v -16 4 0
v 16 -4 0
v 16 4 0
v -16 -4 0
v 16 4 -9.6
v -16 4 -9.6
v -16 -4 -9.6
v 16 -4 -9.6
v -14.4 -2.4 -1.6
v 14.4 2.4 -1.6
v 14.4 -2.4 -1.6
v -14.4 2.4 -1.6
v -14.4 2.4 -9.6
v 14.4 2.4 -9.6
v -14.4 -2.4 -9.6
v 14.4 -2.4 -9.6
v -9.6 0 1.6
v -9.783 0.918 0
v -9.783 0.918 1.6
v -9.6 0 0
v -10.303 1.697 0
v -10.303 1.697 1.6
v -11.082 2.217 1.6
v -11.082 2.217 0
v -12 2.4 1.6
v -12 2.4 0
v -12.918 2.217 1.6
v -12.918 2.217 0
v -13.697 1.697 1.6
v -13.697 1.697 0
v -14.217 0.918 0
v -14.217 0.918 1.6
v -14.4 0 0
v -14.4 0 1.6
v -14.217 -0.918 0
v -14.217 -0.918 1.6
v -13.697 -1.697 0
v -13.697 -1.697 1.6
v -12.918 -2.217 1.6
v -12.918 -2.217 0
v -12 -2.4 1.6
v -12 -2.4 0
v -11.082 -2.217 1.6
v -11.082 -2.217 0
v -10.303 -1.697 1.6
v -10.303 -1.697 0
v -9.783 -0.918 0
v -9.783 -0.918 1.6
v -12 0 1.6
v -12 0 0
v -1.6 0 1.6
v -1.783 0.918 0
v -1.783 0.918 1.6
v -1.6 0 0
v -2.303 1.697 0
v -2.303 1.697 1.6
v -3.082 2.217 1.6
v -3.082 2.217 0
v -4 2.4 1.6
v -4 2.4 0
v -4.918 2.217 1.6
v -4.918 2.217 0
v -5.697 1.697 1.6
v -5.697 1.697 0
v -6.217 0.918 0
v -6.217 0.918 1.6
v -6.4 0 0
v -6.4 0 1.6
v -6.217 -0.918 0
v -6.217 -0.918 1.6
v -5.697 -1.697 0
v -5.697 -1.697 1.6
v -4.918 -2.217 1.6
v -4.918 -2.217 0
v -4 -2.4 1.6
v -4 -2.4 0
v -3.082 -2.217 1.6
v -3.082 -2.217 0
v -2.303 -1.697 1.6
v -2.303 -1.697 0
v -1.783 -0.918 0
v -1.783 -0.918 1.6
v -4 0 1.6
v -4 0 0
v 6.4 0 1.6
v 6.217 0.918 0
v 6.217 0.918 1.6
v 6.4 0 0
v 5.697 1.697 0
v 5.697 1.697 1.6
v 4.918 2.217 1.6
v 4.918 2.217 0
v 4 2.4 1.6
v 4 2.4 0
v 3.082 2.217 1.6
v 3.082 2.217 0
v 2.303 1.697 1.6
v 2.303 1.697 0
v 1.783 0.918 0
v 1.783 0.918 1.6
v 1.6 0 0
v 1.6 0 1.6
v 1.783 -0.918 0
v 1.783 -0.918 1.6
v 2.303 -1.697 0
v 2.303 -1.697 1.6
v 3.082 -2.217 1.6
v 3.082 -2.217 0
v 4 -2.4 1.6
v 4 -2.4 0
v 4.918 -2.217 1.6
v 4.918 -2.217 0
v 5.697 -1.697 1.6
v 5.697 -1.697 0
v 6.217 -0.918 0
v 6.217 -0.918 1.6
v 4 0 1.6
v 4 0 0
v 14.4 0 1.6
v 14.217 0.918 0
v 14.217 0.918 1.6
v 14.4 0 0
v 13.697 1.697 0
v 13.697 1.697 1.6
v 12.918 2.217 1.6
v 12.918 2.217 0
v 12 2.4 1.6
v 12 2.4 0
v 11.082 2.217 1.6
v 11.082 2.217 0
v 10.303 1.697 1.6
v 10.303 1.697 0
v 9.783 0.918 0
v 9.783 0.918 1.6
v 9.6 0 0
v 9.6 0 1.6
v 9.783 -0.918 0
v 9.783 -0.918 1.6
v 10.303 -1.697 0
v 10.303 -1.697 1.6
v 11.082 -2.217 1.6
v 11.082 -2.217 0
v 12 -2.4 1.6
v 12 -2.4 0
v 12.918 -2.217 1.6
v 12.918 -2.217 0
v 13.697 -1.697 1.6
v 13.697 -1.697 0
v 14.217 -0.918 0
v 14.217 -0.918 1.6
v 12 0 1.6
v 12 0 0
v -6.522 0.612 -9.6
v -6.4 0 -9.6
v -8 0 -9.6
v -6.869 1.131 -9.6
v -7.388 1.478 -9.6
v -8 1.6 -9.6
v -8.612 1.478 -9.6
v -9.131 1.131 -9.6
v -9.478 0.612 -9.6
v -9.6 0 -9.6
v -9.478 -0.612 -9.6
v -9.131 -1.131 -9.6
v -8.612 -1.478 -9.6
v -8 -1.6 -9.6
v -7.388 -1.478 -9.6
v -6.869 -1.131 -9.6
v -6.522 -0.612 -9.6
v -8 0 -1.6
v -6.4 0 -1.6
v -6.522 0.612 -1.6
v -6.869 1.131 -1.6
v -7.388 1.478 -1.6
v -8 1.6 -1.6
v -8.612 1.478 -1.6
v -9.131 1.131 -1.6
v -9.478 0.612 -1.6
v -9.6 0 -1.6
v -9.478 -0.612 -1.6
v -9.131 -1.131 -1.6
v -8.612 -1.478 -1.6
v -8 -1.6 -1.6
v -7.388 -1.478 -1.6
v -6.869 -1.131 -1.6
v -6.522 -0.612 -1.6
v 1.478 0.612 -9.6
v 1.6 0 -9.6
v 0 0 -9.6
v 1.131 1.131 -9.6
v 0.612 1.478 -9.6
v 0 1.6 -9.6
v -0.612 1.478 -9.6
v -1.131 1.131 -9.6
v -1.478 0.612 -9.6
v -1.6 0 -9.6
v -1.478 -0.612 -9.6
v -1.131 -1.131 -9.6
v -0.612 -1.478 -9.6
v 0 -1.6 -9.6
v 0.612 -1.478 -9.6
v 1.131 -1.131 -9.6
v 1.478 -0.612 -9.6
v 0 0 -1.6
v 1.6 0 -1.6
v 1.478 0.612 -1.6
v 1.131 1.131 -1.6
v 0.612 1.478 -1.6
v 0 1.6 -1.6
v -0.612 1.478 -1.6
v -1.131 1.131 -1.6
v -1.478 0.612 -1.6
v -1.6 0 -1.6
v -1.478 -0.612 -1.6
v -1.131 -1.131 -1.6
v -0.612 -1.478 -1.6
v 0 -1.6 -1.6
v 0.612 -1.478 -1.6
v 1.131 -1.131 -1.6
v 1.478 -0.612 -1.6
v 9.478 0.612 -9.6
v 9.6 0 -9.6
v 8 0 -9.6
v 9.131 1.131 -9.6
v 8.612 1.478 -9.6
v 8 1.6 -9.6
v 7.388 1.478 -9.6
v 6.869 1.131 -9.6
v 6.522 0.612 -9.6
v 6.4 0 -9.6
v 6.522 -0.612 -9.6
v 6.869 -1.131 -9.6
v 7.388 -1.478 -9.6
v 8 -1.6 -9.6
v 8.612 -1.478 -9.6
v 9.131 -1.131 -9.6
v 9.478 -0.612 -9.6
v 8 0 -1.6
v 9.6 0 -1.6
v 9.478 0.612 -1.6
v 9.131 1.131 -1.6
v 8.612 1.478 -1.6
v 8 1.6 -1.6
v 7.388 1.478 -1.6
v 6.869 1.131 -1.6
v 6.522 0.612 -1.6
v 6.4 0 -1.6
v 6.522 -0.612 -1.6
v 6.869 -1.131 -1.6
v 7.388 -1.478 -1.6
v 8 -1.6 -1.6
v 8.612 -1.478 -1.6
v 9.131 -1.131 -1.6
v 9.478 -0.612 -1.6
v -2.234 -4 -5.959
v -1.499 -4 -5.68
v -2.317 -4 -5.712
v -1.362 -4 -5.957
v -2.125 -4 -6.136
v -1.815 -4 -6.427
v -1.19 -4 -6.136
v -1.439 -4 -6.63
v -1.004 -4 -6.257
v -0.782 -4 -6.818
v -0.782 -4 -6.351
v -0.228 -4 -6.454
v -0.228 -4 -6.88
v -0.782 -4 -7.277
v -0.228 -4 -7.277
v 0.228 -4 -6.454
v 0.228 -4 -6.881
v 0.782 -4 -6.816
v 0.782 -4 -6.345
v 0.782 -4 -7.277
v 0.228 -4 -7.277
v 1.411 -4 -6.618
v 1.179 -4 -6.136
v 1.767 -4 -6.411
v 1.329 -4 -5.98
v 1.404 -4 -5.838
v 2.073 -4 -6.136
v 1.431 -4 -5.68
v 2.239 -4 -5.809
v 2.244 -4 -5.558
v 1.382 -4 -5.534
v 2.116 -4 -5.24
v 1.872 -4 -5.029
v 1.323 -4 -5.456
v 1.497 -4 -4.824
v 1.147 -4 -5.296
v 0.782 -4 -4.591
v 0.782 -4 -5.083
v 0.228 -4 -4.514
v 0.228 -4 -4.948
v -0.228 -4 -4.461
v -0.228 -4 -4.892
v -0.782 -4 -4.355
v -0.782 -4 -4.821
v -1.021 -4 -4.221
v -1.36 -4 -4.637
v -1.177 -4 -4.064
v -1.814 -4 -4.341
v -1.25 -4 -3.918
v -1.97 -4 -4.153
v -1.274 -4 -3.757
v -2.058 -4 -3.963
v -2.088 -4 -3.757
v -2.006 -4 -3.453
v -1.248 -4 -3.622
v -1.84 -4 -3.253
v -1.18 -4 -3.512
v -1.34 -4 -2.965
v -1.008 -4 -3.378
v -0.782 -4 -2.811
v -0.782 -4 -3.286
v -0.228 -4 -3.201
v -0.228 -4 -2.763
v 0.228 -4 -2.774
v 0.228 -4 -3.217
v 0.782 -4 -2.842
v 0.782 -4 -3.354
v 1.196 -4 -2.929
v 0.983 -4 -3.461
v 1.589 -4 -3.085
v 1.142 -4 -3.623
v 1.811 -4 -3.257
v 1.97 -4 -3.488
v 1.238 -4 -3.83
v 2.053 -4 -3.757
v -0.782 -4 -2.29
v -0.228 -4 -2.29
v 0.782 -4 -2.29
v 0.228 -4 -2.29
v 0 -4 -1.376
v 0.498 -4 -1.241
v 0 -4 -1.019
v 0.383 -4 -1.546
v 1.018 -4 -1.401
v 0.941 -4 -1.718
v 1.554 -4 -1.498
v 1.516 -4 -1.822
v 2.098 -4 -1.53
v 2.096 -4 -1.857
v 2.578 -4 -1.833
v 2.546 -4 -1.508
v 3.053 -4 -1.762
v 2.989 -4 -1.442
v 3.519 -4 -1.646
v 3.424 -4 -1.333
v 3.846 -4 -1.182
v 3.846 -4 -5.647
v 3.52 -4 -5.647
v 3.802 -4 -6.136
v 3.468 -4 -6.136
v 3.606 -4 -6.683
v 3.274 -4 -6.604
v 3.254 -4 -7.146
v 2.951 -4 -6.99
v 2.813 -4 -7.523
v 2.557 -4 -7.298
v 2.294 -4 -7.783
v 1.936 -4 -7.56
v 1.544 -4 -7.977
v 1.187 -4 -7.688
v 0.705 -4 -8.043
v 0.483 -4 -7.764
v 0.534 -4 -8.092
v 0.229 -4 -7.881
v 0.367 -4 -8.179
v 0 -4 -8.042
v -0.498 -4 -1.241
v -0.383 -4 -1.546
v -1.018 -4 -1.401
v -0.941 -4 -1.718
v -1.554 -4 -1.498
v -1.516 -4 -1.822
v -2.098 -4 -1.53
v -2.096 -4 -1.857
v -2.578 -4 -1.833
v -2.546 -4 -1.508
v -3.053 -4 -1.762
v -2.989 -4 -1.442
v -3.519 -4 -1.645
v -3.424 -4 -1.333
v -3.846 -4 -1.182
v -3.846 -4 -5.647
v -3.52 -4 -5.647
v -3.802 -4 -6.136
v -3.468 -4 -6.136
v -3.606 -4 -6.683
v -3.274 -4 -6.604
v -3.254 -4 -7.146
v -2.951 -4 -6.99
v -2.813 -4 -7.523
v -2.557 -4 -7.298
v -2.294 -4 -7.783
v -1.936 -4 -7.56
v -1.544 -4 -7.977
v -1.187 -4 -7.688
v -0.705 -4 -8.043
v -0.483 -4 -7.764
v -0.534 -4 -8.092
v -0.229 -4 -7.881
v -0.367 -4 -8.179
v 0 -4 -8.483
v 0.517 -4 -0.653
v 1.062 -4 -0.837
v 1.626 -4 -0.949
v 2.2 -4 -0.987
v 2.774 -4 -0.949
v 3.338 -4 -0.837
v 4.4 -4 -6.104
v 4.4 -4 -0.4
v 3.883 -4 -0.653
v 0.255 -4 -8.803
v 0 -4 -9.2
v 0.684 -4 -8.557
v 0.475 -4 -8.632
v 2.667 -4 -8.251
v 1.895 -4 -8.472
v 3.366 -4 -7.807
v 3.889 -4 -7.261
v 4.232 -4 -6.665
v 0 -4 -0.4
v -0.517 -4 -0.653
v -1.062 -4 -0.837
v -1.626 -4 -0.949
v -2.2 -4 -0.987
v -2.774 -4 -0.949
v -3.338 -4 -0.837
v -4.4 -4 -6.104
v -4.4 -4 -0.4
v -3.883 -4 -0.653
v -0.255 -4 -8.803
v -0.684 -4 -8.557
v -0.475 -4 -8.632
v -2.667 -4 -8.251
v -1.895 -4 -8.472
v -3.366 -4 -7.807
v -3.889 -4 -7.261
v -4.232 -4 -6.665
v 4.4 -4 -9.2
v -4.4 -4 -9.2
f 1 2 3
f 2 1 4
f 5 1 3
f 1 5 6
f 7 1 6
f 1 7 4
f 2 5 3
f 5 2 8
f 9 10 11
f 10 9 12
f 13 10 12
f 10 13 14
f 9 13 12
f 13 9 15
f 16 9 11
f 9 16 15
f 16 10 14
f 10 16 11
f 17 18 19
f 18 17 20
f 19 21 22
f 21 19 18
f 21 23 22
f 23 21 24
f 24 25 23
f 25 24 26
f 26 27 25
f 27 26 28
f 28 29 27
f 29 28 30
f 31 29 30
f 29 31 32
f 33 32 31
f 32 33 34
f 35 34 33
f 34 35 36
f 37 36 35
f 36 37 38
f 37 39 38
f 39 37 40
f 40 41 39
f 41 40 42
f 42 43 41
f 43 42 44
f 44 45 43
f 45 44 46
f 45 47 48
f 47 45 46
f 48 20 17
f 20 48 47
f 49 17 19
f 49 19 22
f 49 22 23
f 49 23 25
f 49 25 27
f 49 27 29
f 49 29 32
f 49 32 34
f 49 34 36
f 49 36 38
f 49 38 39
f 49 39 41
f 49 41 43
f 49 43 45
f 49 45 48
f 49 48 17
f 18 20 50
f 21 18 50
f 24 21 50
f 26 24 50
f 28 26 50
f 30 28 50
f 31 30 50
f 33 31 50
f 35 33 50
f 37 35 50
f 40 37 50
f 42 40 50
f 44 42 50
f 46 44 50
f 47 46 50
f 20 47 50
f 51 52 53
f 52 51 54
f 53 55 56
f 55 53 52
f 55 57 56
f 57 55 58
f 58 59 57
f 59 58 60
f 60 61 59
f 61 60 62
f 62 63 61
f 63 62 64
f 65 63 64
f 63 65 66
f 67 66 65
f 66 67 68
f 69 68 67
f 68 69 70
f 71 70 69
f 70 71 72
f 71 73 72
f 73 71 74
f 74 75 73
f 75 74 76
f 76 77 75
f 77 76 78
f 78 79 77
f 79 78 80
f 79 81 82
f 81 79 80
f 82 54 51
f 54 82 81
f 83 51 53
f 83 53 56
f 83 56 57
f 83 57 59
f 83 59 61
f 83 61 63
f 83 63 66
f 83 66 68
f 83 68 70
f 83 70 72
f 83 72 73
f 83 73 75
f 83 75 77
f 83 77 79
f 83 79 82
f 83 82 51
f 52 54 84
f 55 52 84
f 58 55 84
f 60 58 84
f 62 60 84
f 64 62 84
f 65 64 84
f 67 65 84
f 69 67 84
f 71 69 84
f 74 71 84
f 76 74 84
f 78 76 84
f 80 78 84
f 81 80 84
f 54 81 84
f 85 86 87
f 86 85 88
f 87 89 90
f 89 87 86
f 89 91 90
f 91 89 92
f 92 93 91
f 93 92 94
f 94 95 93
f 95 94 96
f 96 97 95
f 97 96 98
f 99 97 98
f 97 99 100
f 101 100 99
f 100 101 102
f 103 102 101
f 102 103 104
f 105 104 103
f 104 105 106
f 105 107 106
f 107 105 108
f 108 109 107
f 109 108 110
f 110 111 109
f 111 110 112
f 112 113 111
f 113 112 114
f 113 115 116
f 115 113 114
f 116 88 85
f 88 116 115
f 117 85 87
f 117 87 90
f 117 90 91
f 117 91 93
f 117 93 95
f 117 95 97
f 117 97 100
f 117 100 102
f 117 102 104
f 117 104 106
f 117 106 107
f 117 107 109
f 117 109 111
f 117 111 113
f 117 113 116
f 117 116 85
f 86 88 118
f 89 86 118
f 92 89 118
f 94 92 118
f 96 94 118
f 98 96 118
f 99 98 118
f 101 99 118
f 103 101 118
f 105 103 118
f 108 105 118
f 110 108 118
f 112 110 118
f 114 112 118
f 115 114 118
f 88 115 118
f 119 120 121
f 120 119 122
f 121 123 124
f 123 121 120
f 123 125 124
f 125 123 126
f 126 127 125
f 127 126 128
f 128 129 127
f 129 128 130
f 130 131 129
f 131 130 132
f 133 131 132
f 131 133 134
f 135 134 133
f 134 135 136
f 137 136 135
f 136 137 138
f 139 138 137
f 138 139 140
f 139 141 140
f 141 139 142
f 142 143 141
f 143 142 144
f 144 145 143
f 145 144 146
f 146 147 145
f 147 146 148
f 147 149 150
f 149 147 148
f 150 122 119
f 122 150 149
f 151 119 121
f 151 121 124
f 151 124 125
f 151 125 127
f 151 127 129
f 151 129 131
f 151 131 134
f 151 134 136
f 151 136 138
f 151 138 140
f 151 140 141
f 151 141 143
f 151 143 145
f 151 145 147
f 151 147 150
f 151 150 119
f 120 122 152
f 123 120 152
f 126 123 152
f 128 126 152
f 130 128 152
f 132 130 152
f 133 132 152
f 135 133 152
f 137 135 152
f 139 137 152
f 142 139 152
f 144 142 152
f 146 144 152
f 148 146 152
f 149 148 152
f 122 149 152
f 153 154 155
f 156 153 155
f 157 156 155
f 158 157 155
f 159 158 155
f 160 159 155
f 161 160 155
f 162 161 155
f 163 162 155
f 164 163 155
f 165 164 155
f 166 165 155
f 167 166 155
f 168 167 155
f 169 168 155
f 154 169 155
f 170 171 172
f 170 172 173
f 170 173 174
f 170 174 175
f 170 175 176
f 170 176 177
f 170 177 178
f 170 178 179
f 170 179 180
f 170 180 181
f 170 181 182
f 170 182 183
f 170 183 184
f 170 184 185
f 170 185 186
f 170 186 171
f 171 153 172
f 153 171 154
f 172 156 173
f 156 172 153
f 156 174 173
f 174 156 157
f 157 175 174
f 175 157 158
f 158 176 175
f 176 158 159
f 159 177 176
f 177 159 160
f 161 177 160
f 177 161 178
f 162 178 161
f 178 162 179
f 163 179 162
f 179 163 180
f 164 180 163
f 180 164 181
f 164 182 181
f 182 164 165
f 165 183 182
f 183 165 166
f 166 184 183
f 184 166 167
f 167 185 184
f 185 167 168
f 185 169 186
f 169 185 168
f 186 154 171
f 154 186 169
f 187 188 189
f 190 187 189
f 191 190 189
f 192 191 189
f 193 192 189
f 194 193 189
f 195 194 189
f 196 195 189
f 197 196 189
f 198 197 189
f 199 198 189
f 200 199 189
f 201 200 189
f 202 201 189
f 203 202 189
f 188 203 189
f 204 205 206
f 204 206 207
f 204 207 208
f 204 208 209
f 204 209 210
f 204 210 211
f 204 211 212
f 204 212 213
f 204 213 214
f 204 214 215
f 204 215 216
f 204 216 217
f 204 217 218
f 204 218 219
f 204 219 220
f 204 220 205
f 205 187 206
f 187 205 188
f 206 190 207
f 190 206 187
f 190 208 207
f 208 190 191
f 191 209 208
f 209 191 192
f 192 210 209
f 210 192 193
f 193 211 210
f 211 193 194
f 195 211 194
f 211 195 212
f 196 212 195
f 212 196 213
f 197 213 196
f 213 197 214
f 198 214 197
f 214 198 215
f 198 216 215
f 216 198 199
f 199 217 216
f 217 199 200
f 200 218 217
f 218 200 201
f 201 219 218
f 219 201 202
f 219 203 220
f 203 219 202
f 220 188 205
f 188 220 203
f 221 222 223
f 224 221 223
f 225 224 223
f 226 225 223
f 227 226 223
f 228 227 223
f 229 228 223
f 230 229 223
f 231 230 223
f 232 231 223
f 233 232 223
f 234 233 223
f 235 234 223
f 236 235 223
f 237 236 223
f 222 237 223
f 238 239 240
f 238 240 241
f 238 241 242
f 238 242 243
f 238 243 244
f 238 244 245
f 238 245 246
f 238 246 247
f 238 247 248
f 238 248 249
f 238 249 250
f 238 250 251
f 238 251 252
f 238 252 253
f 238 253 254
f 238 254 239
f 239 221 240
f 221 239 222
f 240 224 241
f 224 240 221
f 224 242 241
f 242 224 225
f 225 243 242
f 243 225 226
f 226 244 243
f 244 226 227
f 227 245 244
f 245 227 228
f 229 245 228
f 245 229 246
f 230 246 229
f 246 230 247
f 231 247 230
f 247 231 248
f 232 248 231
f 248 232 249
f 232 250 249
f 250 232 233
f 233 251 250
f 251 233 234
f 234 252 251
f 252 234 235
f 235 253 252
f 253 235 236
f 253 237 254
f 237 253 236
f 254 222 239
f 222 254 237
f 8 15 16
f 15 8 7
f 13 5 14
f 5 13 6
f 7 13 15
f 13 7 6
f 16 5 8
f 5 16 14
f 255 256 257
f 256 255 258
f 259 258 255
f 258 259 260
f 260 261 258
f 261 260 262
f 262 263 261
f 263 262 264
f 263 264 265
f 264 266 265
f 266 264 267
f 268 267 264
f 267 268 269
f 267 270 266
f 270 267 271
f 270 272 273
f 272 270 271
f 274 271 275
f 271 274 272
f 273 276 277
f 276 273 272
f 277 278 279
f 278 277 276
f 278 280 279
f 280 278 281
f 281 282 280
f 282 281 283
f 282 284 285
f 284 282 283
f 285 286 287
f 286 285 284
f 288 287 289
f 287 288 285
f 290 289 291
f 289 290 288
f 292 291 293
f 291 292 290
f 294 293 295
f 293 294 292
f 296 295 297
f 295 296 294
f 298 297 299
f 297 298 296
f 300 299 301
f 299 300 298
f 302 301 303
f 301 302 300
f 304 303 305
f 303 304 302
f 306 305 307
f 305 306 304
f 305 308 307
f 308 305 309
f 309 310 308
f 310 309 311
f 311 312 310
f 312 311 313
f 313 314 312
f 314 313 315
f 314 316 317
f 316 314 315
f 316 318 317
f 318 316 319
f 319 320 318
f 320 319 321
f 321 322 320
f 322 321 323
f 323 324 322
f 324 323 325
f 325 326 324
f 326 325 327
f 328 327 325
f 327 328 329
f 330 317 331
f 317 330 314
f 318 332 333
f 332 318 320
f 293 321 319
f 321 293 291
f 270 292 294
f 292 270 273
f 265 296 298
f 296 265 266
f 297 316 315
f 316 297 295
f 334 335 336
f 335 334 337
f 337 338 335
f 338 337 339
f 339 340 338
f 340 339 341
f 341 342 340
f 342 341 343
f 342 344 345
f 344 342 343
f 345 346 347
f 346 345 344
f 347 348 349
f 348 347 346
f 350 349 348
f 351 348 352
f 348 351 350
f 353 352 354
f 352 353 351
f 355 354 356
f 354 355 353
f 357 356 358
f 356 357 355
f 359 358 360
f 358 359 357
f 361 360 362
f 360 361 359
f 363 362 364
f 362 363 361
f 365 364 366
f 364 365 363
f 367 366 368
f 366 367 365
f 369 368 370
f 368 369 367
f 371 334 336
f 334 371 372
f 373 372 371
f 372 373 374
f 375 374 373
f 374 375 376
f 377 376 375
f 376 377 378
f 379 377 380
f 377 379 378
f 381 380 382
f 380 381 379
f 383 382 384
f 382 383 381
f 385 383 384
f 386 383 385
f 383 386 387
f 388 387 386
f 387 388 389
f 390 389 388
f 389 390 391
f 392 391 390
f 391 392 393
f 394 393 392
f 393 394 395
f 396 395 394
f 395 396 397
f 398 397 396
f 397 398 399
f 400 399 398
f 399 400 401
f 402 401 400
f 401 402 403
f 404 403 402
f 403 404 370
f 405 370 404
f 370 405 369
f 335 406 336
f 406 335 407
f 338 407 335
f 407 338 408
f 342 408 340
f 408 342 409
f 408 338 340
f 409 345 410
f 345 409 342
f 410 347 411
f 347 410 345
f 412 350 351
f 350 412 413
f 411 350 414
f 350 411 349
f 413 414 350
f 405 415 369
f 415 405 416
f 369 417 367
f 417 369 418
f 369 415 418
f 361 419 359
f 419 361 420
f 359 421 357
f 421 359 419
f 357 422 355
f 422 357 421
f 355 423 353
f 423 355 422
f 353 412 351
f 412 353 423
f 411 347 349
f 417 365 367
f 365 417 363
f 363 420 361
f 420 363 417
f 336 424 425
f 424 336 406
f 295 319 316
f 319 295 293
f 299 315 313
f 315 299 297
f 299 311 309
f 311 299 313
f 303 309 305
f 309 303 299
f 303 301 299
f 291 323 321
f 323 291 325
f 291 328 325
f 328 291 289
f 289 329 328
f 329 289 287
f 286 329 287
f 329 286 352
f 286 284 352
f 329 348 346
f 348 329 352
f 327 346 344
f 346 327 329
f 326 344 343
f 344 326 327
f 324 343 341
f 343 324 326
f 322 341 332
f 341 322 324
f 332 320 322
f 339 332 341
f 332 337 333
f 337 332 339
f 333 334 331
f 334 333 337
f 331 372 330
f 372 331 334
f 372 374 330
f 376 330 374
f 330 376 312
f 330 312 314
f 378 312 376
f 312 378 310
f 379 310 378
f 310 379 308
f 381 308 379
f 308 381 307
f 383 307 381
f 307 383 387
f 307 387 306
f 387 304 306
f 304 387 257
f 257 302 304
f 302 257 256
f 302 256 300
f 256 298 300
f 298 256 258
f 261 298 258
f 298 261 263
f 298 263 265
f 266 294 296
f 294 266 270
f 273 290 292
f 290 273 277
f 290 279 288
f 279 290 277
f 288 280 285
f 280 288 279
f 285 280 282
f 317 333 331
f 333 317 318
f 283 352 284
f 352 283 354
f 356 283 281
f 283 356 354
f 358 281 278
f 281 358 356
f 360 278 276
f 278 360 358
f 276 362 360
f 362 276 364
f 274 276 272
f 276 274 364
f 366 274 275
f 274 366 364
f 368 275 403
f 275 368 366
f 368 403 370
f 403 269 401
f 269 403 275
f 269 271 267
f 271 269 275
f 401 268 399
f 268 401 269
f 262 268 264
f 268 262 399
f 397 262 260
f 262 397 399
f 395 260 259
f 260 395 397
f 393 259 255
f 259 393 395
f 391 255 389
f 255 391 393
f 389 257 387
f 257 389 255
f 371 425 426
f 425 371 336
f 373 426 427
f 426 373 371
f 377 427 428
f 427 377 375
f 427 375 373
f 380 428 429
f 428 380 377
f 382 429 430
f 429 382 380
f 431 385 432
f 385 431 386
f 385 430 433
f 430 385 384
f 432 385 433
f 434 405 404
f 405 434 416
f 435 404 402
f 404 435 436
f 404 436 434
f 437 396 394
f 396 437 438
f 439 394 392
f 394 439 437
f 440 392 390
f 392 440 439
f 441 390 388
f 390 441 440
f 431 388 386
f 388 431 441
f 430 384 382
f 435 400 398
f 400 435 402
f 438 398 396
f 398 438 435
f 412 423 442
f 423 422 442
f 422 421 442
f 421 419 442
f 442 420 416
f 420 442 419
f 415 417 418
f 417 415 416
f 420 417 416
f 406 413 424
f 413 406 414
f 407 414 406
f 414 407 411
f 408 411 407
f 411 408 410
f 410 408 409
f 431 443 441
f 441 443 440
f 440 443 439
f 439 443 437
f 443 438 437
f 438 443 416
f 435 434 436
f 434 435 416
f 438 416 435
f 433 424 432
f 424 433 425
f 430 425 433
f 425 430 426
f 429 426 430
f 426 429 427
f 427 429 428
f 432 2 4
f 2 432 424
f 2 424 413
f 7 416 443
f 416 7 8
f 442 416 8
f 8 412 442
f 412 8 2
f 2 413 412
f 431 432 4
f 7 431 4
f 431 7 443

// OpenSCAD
// file: ../p/4-4edge.scad
use <../lib.scad>
function ldraw_lib__4_4edge() = [
// 0 Circle 1.0
// 0 Name: 4-4edge.dat
// 0 Author: James Jessiman
// 0 !LDRAW_ORG Primitive UPDATE 2017-01
// 0 !LICENSE Licensed under CC BY 2.0 and CC BY 4.0 : see CAreadme.txt
// 
// 0 BFC CERTIFY CCW
  [0,"BFC","CERTIFY"],
  [0,"BFC","CCW"],
// 
// 0 !HISTORY 1998-12-15 [PTadmin] Official Update 1998-10
// 0 !HISTORY 2005-12-28 [PTadmin] Official Update 2005-01
// 0 !HISTORY 2007-06-24 [PTadmin] Header formatted for Contributor Agreement
// 0 !HISTORY 2008-07-01 [PTadmin] Official Update 2008-01
// 0 !HISTORY 2017-01-15 [Steffen] BFCed
// 0 !HISTORY 2017-12-30 [PTadmin] Official Update 2017-01
// 
// 
// 2 24 1 0 0 0.9239 0 0.3827
  [2,24,1,0,0,0.9239,0,0.3827],
// 2 24 0.9239 0 0.3827 0.7071 0 0.7071
  [2,24,0.9239,0,0.3827,0.7071,0,0.7071],
// 2 24 0.7071 0 0.7071 0.3827 0 0.9239
  [2,24,0.7071,0,0.7071,0.3827,0,0.9239],
// 2 24 0.3827 0 0.9239 0 0 1
  [2,24,0.3827,0,0.9239,0,0,1],
// 2 24 0 0 1 -0.3827 0 0.9239
  [2,24,0,0,1,-0.3827,0,0.9239],
// 2 24 -0.3827 0 0.9239 -0.7071 0 0.7071
  [2,24,-0.3827,0,0.9239,-0.7071,0,0.7071],
// 2 24 -0.7071 0 0.7071 -0.9239 0 0.3827
  [2,24,-0.7071,0,0.7071,-0.9239,0,0.3827],
// 2 24 -0.9239 0 0.3827 -1 0 -0
  [2,24,-0.9239,0,0.3827,-1,0,-0],
// 2 24 -1 0 -0 -0.9239 0 -0.3827
  [2,24,-1,0,-0,-0.9239,0,-0.3827],
// 2 24 -0.9239 0 -0.3827 -0.7071 0 -0.7071
  [2,24,-0.9239,0,-0.3827,-0.7071,0,-0.7071],
// 2 24 -0.7071 0 -0.7071 -0.3827 0 -0.9239
  [2,24,-0.7071,0,-0.7071,-0.3827,0,-0.9239],
// 2 24 -0.3827 0 -0.9239 0 0 -1
  [2,24,-0.3827,0,-0.9239,0,0,-1],
// 2 24 0 0 -1 0.3827 0 -0.9239
  [2,24,0,0,-1,0.3827,0,-0.9239],
// 2 24 0.3827 0 -0.9239 0.7071 0 -0.7071
  [2,24,0.3827,0,-0.9239,0.7071,0,-0.7071],
// 2 24 0.7071 0 -0.7071 0.9239 0 -0.3827
  [2,24,0.7071,0,-0.7071,0.9239,0,-0.3827],
// 2 24 0.9239 0 -0.3827 1 0 0
  [2,24,0.9239,0,-0.3827,1,0,0],
];
module ldraw_lib__4_4edge(step=0, col=false, unit=2/5, alt=false, line=0.2, solid=!$preview)
    makepoly(ldraw_lib__4_4edge(), step=step, col=col, unit=unit, alt=alt, line=line, solid=solid);
ldraw_lib__4_4edge(line=0.2);
// file: ../p/4-4disc.scad
use <../lib.scad>
function ldraw_lib__4_4disc() = [
// 0 Disc 1.0
// 0 Name: 4-4disc.dat
// 0 Author: James Jessiman
// 0 !LDRAW_ORG Primitive UPDATE 2002-02
// 0 !LICENSE Licensed under CC BY 2.0 and CC BY 4.0 : see CAreadme.txt
// 
// 0 BFC CERTIFY CCW
  [0,"BFC","CERTIFY"],
  [0,"BFC","CCW"],
// 
// 0 !HISTORY 1998-12-15 [PTadmin] Official Update 1998-10
// 0 !HISTORY 2002-03-23 [sbliss] Added BFC statement
// 0 !HISTORY 2002-04-25 [PTadmin] Official Update 2002-02
// 0 !HISTORY 2007-06-24 [PTadmin] Header formatted for Contributor Agreement
// 0 !HISTORY 2008-07-01 [PTadmin] Official Update 2008-01
// 
// 
// 3 16 0 0 0 1 0 0 0.9239 0 0.3827
  [3,16,0,0,0,1,0,0,0.9239,0,0.3827],
// 3 16 0 0 0 0.9239 0 0.3827 0.7071 0 0.7071
  [3,16,0,0,0,0.9239,0,0.3827,0.7071,0,0.7071],
// 3 16 0 0 0 0.7071 0 0.7071 0.3827 0 0.9239
  [3,16,0,0,0,0.7071,0,0.7071,0.3827,0,0.9239],
// 3 16 0 0 0 0.3827 0 0.9239 0 0 1
  [3,16,0,0,0,0.3827,0,0.9239,0,0,1],
// 3 16 0 0 0 0 0 1 -0.3827 0 0.9239
  [3,16,0,0,0,0,0,1,-0.3827,0,0.9239],
// 3 16 0 0 0 -0.3827 0 0.9239 -0.7071 0 0.7071
  [3,16,0,0,0,-0.3827,0,0.9239,-0.7071,0,0.7071],
// 3 16 0 0 0 -0.7071 0 0.7071 -0.9239 0 0.3827
  [3,16,0,0,0,-0.7071,0,0.7071,-0.9239,0,0.3827],
// 3 16 0 0 0 -0.9239 0 0.3827 -1 0 -0
  [3,16,0,0,0,-0.9239,0,0.3827,-1,0,-0],
// 3 16 0 0 0 -1 0 -0 -0.9239 0 -0.3827
  [3,16,0,0,0,-1,0,-0,-0.9239,0,-0.3827],
// 3 16 0 0 0 -0.9239 0 -0.3827 -0.7071 0 -0.7071
  [3,16,0,0,0,-0.9239,0,-0.3827,-0.7071,0,-0.7071],
// 3 16 0 0 0 -0.7071 0 -0.7071 -0.3827 0 -0.9239
  [3,16,0,0,0,-0.7071,0,-0.7071,-0.3827,0,-0.9239],
// 3 16 0 0 0 -0.3827 0 -0.9239 0 0 -1
  [3,16,0,0,0,-0.3827,0,-0.9239,0,0,-1],
// 3 16 0 0 0 0 0 -1 0.3827 0 -0.9239
  [3,16,0,0,0,0,0,-1,0.3827,0,-0.9239],
// 3 16 0 0 0 0.3827 0 -0.9239 0.7071 0 -0.7071
  [3,16,0,0,0,0.3827,0,-0.9239,0.7071,0,-0.7071],
// 3 16 0 0 0 0.7071 0 -0.7071 0.9239 0 -0.3827
  [3,16,0,0,0,0.7071,0,-0.7071,0.9239,0,-0.3827],
// 3 16 0 0 0 0.9239 0 -0.3827 1 0 0
  [3,16,0,0,0,0.9239,0,-0.3827,1,0,0],
// 0
];
module ldraw_lib__4_4disc(step=0, col=false, unit=2/5, alt=false, line=0.2, solid=!$preview)
    makepoly(ldraw_lib__4_4disc(), step=step, col=col, unit=unit, alt=alt, line=line, solid=solid);
ldraw_lib__4_4disc(line=0.2);
// file: ../p/4-4cyli.scad
use <../lib.scad>
$fa=1; $fs=0.2;
function ldraw_lib__4_4cyli(realsolid=false) = [
// 0 Cylinder 1.0
// 0 Name: 4-4cyli.dat
// 0 Author: James Jessiman
// 0 !LDRAW_ORG Primitive UPDATE 2005-01
// 0 !LICENSE Licensed under CC BY 2.0 and CC BY 4.0 : see CAreadme.txt
// 
// 0 BFC CERTIFY CCW
  [0,"BFC","CERTIFY"],
  [0,"BFC","CCW"],
// 
// 0 !HISTORY 1998-12-15 [PTadmin] Official Update 1998-10
// 0 !HISTORY 2002-03-23 [sbliss] Added BFC statement; merged headers from files in distributions LDraw 0.27 and Complete.
// 0 !HISTORY 2002-04-25 [PTadmin] Official Update 2002-02
// 0 !HISTORY 2004-12-14 [guyvivan] BFC CCW
// 0 !HISTORY 2005-12-28 [PTadmin] Official Update 2005-01
// 0 !HISTORY 2007-06-24 [PTadmin] Header formatted for Contributor Agreement
// 0 !HISTORY 2008-07-01 [PTadmin] Official Update 2008-01
// 
// 
// 4 16 1 1 0 0.9239 1 0.3827 0.9239 0 0.3827 1 0 0
  [4,16,1,1,0,0.9239,1,0.3827,0.9239,0,0.3827,1,0,0],
// 5 24 1 0 0 1 1 0 0.9239 0 0.3827 0.9239 0 -0.3827
  [5,24,1,0,0,1,1,0,0.9239,0,0.3827,0.9239,0,-0.3827],
// 4 16 0.9239 1 0.3827 0.7071 1 0.7071 0.7071 0 0.7071 0.9239 0 0.3827
  [4,16,0.9239,1,0.3827,0.7071,1,0.7071,0.7071,0,0.7071,0.9239,0,0.3827],
// 5 24 0.9239 0 0.3827 0.9239 1 0.3827 0.7071 0 0.7071 1 0 0
  [5,24,0.9239,0,0.3827,0.9239,1,0.3827,0.7071,0,0.7071,1,0,0],
// 4 16 0.7071 1 0.7071 0.3827 1 0.9239 0.3827 0 0.9239 0.7071 0 0.7071
  [4,16,0.7071,1,0.7071,0.3827,1,0.9239,0.3827,0,0.9239,0.7071,0,0.7071],
// 5 24 0.7071 0 0.7071 0.7071 1 0.7071 0.3827 0 0.9239 0.9239 0 0.3827
  [5,24,0.7071,0,0.7071,0.7071,1,0.7071,0.3827,0,0.9239,0.9239,0,0.3827],
// 4 16 0.3827 1 0.9239 0 1 1 0 0 1 0.3827 0 0.9239
  [4,16,0.3827,1,0.9239,0,1,1,0,0,1,0.3827,0,0.9239],
// 5 24 0.3827 0 0.9239 0.3827 1 0.9239 0 0 1 0.7071 0 0.7071
  [5,24,0.3827,0,0.9239,0.3827,1,0.9239,0,0,1,0.7071,0,0.7071],
// 4 16 0 1 1 -0.3827 1 0.9239 -0.3827 0 0.9239 0 0 1
  [4,16,0,1,1,-0.3827,1,0.9239,-0.3827,0,0.9239,0,0,1],
// 5 24 0 0 1 0 1 1 -0.3827 0 0.9239 0.3827 0 0.9239
  [5,24,0,0,1,0,1,1,-0.3827,0,0.9239,0.3827,0,0.9239],
// 4 16 -0.3827 1 0.9239 -0.7071 1 0.7071 -0.7071 0 0.7071 -0.3827 0 0.9239
  [4,16,-0.3827,1,0.9239,-0.7071,1,0.7071,-0.7071,0,0.7071,-0.3827,0,0.9239],
// 5 24 -0.3827 0 0.9239 -0.3827 1 0.9239 -0.7071 0 0.7071 0 0 1
  [5,24,-0.3827,0,0.9239,-0.3827,1,0.9239,-0.7071,0,0.7071,0,0,1],
// 4 16 -0.7071 1 0.7071 -0.9239 1 0.3827 -0.9239 0 0.3827 -0.7071 0 0.7071
  [4,16,-0.7071,1,0.7071,-0.9239,1,0.3827,-0.9239,0,0.3827,-0.7071,0,0.7071],
// 5 24 -0.7071 0 0.7071 -0.7071 1 0.7071 -0.9239 0 0.3827 -0.3827 0 0.9239
  [5,24,-0.7071,0,0.7071,-0.7071,1,0.7071,-0.9239,0,0.3827,-0.3827,0,0.9239],
// 4 16 -0.9239 1 0.3827 -1 1 0 -1 0 0 -0.9239 0 0.3827
  [4,16,-0.9239,1,0.3827,-1,1,0,-1,0,0,-0.9239,0,0.3827],
// 5 24 -0.9239 0 0.3827 -0.9239 1 0.3827 -1 0 0 -0.7071 0 0.7071
  [5,24,-0.9239,0,0.3827,-0.9239,1,0.3827,-1,0,0,-0.7071,0,0.7071],
// 4 16 -1 1 0 -0.9239 1 -0.3827 -0.9239 0 -0.3827 -1 0 0
  [4,16,-1,1,0,-0.9239,1,-0.3827,-0.9239,0,-0.3827,-1,0,0],
// 5 24 -1 0 0 -1 1 0 -0.9239 0 -0.3827 -0.9239 0 0.3827
  [5,24,-1,0,0,-1,1,0,-0.9239,0,-0.3827,-0.9239,0,0.3827],
// 4 16 -0.9239 1 -0.3827 -0.7071 1 -0.7071 -0.7071 0 -0.7071 -0.9239 0 -0.3827
  [4,16,-0.9239,1,-0.3827,-0.7071,1,-0.7071,-0.7071,0,-0.7071,-0.9239,0,-0.3827],
// 5 24 -0.9239 0 -0.3827 -0.9239 1 -0.3827 -0.7071 0 -0.7071 -1 0 0
  [5,24,-0.9239,0,-0.3827,-0.9239,1,-0.3827,-0.7071,0,-0.7071,-1,0,0],
// 4 16 -0.7071 1 -0.7071 -0.3827 1 -0.9239 -0.3827 0 -0.9239 -0.7071 0 -0.7071
  [4,16,-0.7071,1,-0.7071,-0.3827,1,-0.9239,-0.3827,0,-0.9239,-0.7071,0,-0.7071],
// 5 24 -0.7071 0 -0.7071 -0.7071 1 -0.7071 -0.3827 0 -0.9239 -0.9239 0 -0.3827
  [5,24,-0.7071,0,-0.7071,-0.7071,1,-0.7071,-0.3827,0,-0.9239,-0.9239,0,-0.3827],
// 4 16 -0.3827 1 -0.9239 0 1 -1 0 0 -1 -0.3827 0 -0.9239
  [4,16,-0.3827,1,-0.9239,0,1,-1,0,0,-1,-0.3827,0,-0.9239],
// 5 24 -0.3827 0 -0.9239 -0.3827 1 -0.9239 0 0 -1 -0.7071 0 -0.7071
  [5,24,-0.3827,0,-0.9239,-0.3827,1,-0.9239,0,0,-1,-0.7071,0,-0.7071],
// 4 16 0 1 -1 0.3827 1 -0.9239 0.3827 0 -0.9239 0 0 -1
  [4,16,0,1,-1,0.3827,1,-0.9239,0.3827,0,-0.9239,0,0,-1],
// 5 24 0 0 -1 0 1 -1 0.3827 0 -0.9239 -0.3827 0 -0.9239
  [5,24,0,0,-1,0,1,-1,0.3827,0,-0.9239,-0.3827,0,-0.9239],
// 4 16 0.3827 1 -0.9239 0.7071 1 -0.7071 0.7071 0 -0.7071 0.3827 0 -0.9239
  [4,16,0.3827,1,-0.9239,0.7071,1,-0.7071,0.7071,0,-0.7071,0.3827,0,-0.9239],
// 5 24 0.3827 0 -0.9239 0.3827 1 -0.9239 0.7071 0 -0.7071 0 0 -1
  [5,24,0.3827,0,-0.9239,0.3827,1,-0.9239,0.7071,0,-0.7071,0,0,-1],
// 4 16 0.7071 1 -0.7071 0.9239 1 -0.3827 0.9239 0 -0.3827 0.7071 0 -0.7071
  [4,16,0.7071,1,-0.7071,0.9239,1,-0.3827,0.9239,0,-0.3827,0.7071,0,-0.7071],
// 5 24 0.7071 0 -0.7071 0.7071 1 -0.7071 0.9239 0 -0.3827 0.3827 0 -0.9239
  [5,24,0.7071,0,-0.7071,0.7071,1,-0.7071,0.9239,0,-0.3827,0.3827,0,-0.9239],
// 4 16 0.9239 1 -0.3827 1 1 0 1 0 0 0.9239 0 -0.3827
  [4,16,0.9239,1,-0.3827,1,1,0,1,0,0,0.9239,0,-0.3827],
// 5 24 0.9239 0 -0.3827 0.9239 1 -0.3827 1 0 0 0.7071 0 -0.7071
  [5,24,0.9239,0,-0.3827,0.9239,1,-0.3827,1,0,0,0.7071,0,-0.7071],
// 0
];
module ldraw_lib__4_4cyli(step=0, col=false, unit=2/5, alt=false, line=0.2, solid=!$preview)
    makepoly(ldraw_lib__4_4cyli(solid), step=step, col=col, unit=unit, alt=alt, line=line, solid=solid);
ldraw_lib__4_4cyli(line=0.2);
// file: ../p/stud3.scad
use <../lib.scad>
use <4-4cyli.scad>
use <4-4disc.scad>
use <4-4edge.scad>
function ldraw_lib__stud3() = [
// 0 Stud Tube Solid
// 0 Name: stud3.dat
// 0 Author: James Jessiman
// 0 !LDRAW_ORG Primitive UPDATE 2012-01
// 0 !LICENSE Licensed under CC BY 4.0 : see CAreadme.txt
// 
// 0 BFC CERTIFY CCW
  [0,"BFC","CERTIFY"],
  [0,"BFC","CCW"],
// 
// 0 !HISTORY 2002-04-04 [sbliss] Modified for BFC compliance
// 0 !HISTORY 2002-04-25 [PTadmin] Official Update 2002-02
// 0 !HISTORY 2007-06-24 [PTadmin] Header formatted for Contributor Agreement
// 0 !HISTORY 2008-07-01 [PTadmin] Official Update 2008-01
// 0 !HISTORY 2012-02-16 [Philo] Changed to CCW
// 0 !HISTORY 2012-03-30 [PTadmin] Official Update 2012-01
// 
// 
// 1 16 0 -4 0 4 0 0 0 1 0 0 0 4 4-4edge.dat
  [1,16,0,-4,0,4,0,0,0,1,0,0,0,4, ldraw_lib__4_4edge()],
// 1 16 0 0 0 4 0 0 0 1 0 0 0 4 4-4edge.dat
  [1,16,0,0,0,4,0,0,0,1,0,0,0,4, ldraw_lib__4_4edge()],
// 1 16 0 -4 0 4 0 0 0 1 0 0 0 4 4-4disc.dat
  [1,16,0,-4,0,4,0,0,0,1,0,0,0,4, ldraw_lib__4_4disc()],
  [-1,16,0,0,0,4,0,0,0,-1,0,0,0,4, ldraw_lib__4_4disc()],
// 1 16 0 -4 0 4 0 0 0 4 0 0 0 4 4-4cyli.dat
  [1,16,0,-4,0,4,0,0,0,4,0,0,0,4, ldraw_lib__4_4cyli()],
];
module ldraw_lib__stud3(step=0, col=false, unit=2/5, alt=false, line=0.2, solid=!$preview)
    makepoly(ldraw_lib__stud3(), step=step, col=col, unit=unit, alt=alt, line=line, solid=solid);
ldraw_lib__stud3(line=0.2);
// file: ../p/stud.scad
use <../lib.scad>
use <4-4cyli.scad>
use <4-4disc.scad>
use <4-4edge.scad>
function ldraw_lib__stud() = [
// 0 Stud
// 0 Name: stud.dat
// 0 Author: James Jessiman
// 0 !LDRAW_ORG Primitive UPDATE 2012-01
// 0 !LICENSE Licensed under CC BY 4.0 : see CAreadme.txt
// 
// 0 BFC CERTIFY CCW
  [0,"BFC","CERTIFY"],
  [0,"BFC","CCW"],
// 
// 0 !HISTORY 2002-04-04 [sbliss] Modified for BFC compliance
// 0 !HISTORY 2002-04-25 [PTadmin] Official Update 2002-02
// 0 !HISTORY 2007-06-24 [PTadmin] Header formatted for Contributor Agreement
// 0 !HISTORY 2008-07-01 [PTadmin] Official Update 2008-01
// 0 !HISTORY 2012-02-16 [Philo] Changed to CCW
// 0 !HISTORY 2012-03-30 [PTadmin] Official Update 2012-01
// 
// 
// 1 16 0 0 0 6 0 0 0 1 0 0 0 6 4-4edge.dat
  [1,16,0,0,0,6,0,0,0,1,0,0,0,6, ldraw_lib__4_4edge()],
// 1 16 0 -4 0 6 0 0 0 1 0 0 0 6 4-4edge.dat
  [1,16,0,-4,0,6,0,0,0,1,0,0,0,6, ldraw_lib__4_4edge()],
// 1 16 0 0 0 6 0 0 0 -4 0 0 0 6 4-4cyli.dat
  [1,16,0,0,0,6,0,0,0,-4,0,0,0,6, ldraw_lib__4_4cyli()],
// 1 16 0 -4 0 6 0 0 0 1 0 0 0 6 4-4disc.dat
  [1,16,0,-4,0,6,0,0,0,1,0,0,0,6, ldraw_lib__4_4disc()],
  [-1,16,0,0,0,6,0,0,0,-1,0,0,0,6, ldraw_lib__4_4disc()],
];
module ldraw_lib__stud(step=0, col=false, unit=2/5, alt=false, line=0.2, solid=!$preview)
    makepoly(ldraw_lib__stud(), step=step, col=col, unit=unit, alt=alt, line=line, solid=solid);
ldraw_lib__stud(line=0.2);
// file: ../p/box5.scad
use <../lib.scad>
function ldraw_lib__box5() = [
// 0 Box with 5 Faces and All Edges
// 0 Name: box5.dat
// 0 Author: James Jessiman
// 0 !LDRAW_ORG Primitive UPDATE 2012-01
// 0 !LICENSE Licensed under CC BY 2.0 and CC BY 4.0 : see CAreadme.txt
// 
// 0 BFC CERTIFY CCW
  [0,"BFC","CERTIFY"],
  [0,"BFC","CCW"],
// 
// 0 !HISTORY 2002-04-03 [sbliss] Modified for BFC compliance
// 0 !HISTORY 2002-04-25 [PTadmin] Official Update 2002-02
// 0 !HISTORY 2007-06-24 [PTadmin] Header formatted for Contributor Agreement
// 0 !HISTORY 2008-07-01 [PTadmin] Official Update 2008-01
// 0 !HISTORY 2012-02-16 [Philo] Changed to CCW
// 0 !HISTORY 2012-03-30 [PTadmin] Official Update 2012-01
// 
// 
// 2 24 1 1 1 -1 1 1
  [2,24,1,1,1,-1,1,1],
// 2 24 -1 1 1 -1 1 -1
  [2,24,-1,1,1,-1,1,-1],
// 2 24 -1 1 -1 1 1 -1
  [2,24,-1,1,-1,1,1,-1],
// 2 24 1 1 -1 1 1 1
  [2,24,1,1,-1,1,1,1],
// 2 24 1 0 1 -1 0 1
  [2,24,1,0,1,-1,0,1],
// 2 24 -1 0 1 -1 0 -1
  [2,24,-1,0,1,-1,0,-1],
// 2 24 -1 0 -1 1 0 -1
  [2,24,-1,0,-1,1,0,-1],
// 2 24 1 0 -1 1 0 1
  [2,24,1,0,-1,1,0,1],
// 2 24 1 0 1 1 1 1
  [2,24,1,0,1,1,1,1],
// 2 24 -1 0 1 -1 1 1
  [2,24,-1,0,1,-1,1,1],
// 2 24 1 0 -1 1 1 -1
  [2,24,1,0,-1,1,1,-1],
// 2 24 -1 0 -1 -1 1 -1
  [2,24,-1,0,-1,-1,1,-1],
// 4 16 -1 1 1 1 1 1 1 1 -1 -1 1 -1
  [4,16,-1,1,1,1,1,1,1,1,-1,-1,1,-1],
// 4 16 -1 1 1 -1 0 1 1 0 1 1 1 1
  [4,16,-1,1,1,-1,0,1,1,0,1,1,1,1],
// 4 16 -1 1 -1 -1 0 -1 -1 0 1 -1 1 1
  [4,16,-1,1,-1,-1,0,-1,-1,0,1,-1,1,1],
// 4 16 1 1 -1 1 0 -1 -1 0 -1 -1 1 -1
  [4,16,1,1,-1,1,0,-1,-1,0,-1,-1,1,-1],
// 4 16 1 1 1 1 0 1 1 0 -1 1 1 -1
  [4,16,1,1,1,1,0,1,1,0,-1,1,1,-1],
];
makepoly(ldraw_lib__box5(), line=0.2);
// file: ../p/box4t.scad
use <../lib.scad>
function ldraw_lib__box4t() = [
// 0 Box with 4 Adjacent Faces and All Edges
// 0 Name: box4t.dat
// 0 Author: Tore Eriksson [Tore_Eriksson]
// 0 !LDRAW_ORG Primitive UPDATE 2003-02
// 0 !LICENSE Licensed under CC BY 2.0 and CC BY 4.0 : see CAreadme.txt
// 
// 0 BFC CERTIFY CCW
  [0,"BFC","CERTIFY"],
  [0,"BFC","CCW"],
// 
// 0 !HISTORY 1997-09-29 [PTadmin] Official Update 1997-15
// 0 !HISTORY 2002-08-31 [izanette] Modified with WINDZ for BFC compliance
// 0 !HISTORY 2003-08-01 [PTadmin] Official Update 2003-02
// 0 !HISTORY 2007-06-24 [PTadmin] Header formatted for Contributor Agreement
// 0 !HISTORY 2008-07-01 [PTadmin] Official Update 2008-01
// 
// 
// 2 24 1 1 1 -1 1 1
  [2,24,1,1,1,-1,1,1],
// 2 24 -1 1 1 -1 1 -1
  [2,24,-1,1,1,-1,1,-1],
// 2 24 -1 1 -1 1 1 -1
  [2,24,-1,1,-1,1,1,-1],
// 2 24 1 1 -1 1 1 1
  [2,24,1,1,-1,1,1,1],
// 2 24 1 0 1 -1 0 1
  [2,24,1,0,1,-1,0,1],
// 2 24 -1 0 1 -1 0 -1
  [2,24,-1,0,1,-1,0,-1],
// 2 24 -1 0 -1 1 0 -1
  [2,24,-1,0,-1,1,0,-1],
// 2 24 1 0 -1 1 0 1
  [2,24,1,0,-1,1,0,1],
// 2 24 1 0 1 1 1 1
  [2,24,1,0,1,1,1,1],
// 2 24 -1 0 1 -1 1 1
  [2,24,-1,0,1,-1,1,1],
// 2 24 1 0 -1 1 1 -1
  [2,24,1,0,-1,1,1,-1],
// 2 24 -1 0 -1 -1 1 -1
  [2,24,-1,0,-1,-1,1,-1],
// 4 16 1 1 1 1 1 -1 -1 1 -1 -1 1 1
  [4,16,1,1,1,1,1,-1,-1,1,-1,-1,1,1],
// 4 16 1 1 1 -1 1 1 -1 0 1 1 0 1
  [4,16,1,1,1,-1,1,1,-1,0,1,1,0,1],
// 4 16 -1 1 1 -1 1 -1 -1 0 -1 -1 0 1
  [4,16,-1,1,1,-1,1,-1,-1,0,-1,-1,0,1],
// 0 4 16 -1 1 -1 -1 0 -1 1 0 -1 1 1 -1
// 4 16 1 1 -1 1 1 1 1 0 1 1 0 -1
  [4,16,1,1,-1,1,1,1,1,0,1,1,0,-1],
// 0
];
makepoly(ldraw_lib__box4t(), line=0.2);
// file: s/3010s01.scad
use <../../lib.scad>
use <../../p/box4t.scad>
use <../../p/box5.scad>
use <../../p/stud.scad>
use <../../p/stud3.scad>
$fa=1; $fs=0.2;
function ldraw_lib__s__3010s01(realsolid=false) = [
// 0 ~Brick  1 x  4 without Front Face
// 0 Name: s\3010s01.dat
// 0 Author: Tony Hafner [hafhead]
// 0 !LDRAW_ORG Subpart UPDATE 2003-02
// 0 !LICENSE Licensed under CC BY 2.0 and CC BY 4.0 : see CAreadme.txt
// 
// 0 BFC CERTIFY CW
  [0,"BFC","CERTIFY"],
  [0,"BFC","CW"],
// 
// 0 !HISTORY 2003-08-01 [PTadmin] Official Update 2003-02
// 0 !HISTORY 2007-08-29 [PTadmin] Header formatted for Contributor Agreement
// 0 !HISTORY 2008-07-01 [PTadmin] Official Update 2008-01
// 
// 
// 1 16 0 24 0 40 0 0 0 -24 0 0 0 10 box4t.dat
  [1,16,0,24,0,40,0,0,0,-24,0,0,0,10, ldraw_lib__box4t(realsolid)],
// 0 BFC INVERTNEXT
  [0,"BFC","INVERTNEXT"],
// 1 16 0 24 0 36 0 0 0 -20 0 0 0 6 box5.dat
  [1,16,0,24,0,36,0,0,0,-20,0,0,0,6, ldraw_lib__box5(realsolid)],
// 1 16 -30 0 0 1 0 0 0 1 0 0 0 1 stud.dat
  [1,16,-30,0,0,1,0,0,0,1,0,0,0,1, ldraw_lib__stud(realsolid)],
// 1 16 -10 0 0 1 0 0 0 1 0 0 0 1 stud.dat
  [1,16,-10,0,0,1,0,0,0,1,0,0,0,1, ldraw_lib__stud(realsolid)],
// 1 16 10 0 0 1 0 0 0 1 0 0 0 1 stud.dat
  [1,16,10,0,0,1,0,0,0,1,0,0,0,1, ldraw_lib__stud(realsolid)],
// 1 16 30 0 0 1 0 0 0 1 0 0 0 1 stud.dat
  [1,16,30,0,0,1,0,0,0,1,0,0,0,1, ldraw_lib__stud(realsolid)],
// 1 16 -20 4 0 1 0 0 0 -5 0 0 0 1 stud3.dat
  [1,16,-20,4,0,1,0,0,0,-5,0,0,0,1, ldraw_lib__stud3(realsolid)],
// 1 16 0 4 0 1 0 0 0 -5 0 0 0 1 stud3.dat
  [1,16,0,4,0,1,0,0,0,-5,0,0,0,1, ldraw_lib__stud3(realsolid)],
// 1 16 20 4 0 1 0 0 0 -5 0 0 0 1 stud3.dat
  [1,16,20,4,0,1,0,0,0,-5,0,0,0,1, ldraw_lib__stud3(realsolid)],
// 4 16 -40 24 -10 40 24 -10 36 24 -6 -36 24 -6
  [4,16,-40,24,-10,40,24,-10,36,24,-6,-36,24,-6],
// 4 16 -40 24 10 -36 24 6 36 24 6 40 24 10
  [4,16,-40,24,10,-36,24,6,36,24,6,40,24,10],
// 4 16 -40 24 -10 -36 24 -6 -36 24 6 -40 24 10
  [4,16,-40,24,-10,-36,24,-6,-36,24,6,-40,24,10],
// 4 16 40 24 -10 40 24 10 36 24 6 36 24 -6
  [4,16,40,24,-10,40,24,10,36,24,6,36,24,-6],
// 0
];
module ldraw_lib__s__3010s01(step=0, col=false, unit=2/5, alt=false, line=0.2, solid=!$preview)
    makepoly(ldraw_lib__s__3010s01(solid), step=step, col=col, unit=unit, alt=alt, line=line, solid=solid);
ldraw_lib__s__3010s01(line=0.2);
// main file
use <../lib.scad>
use <s/3010s01.scad>
use <s/4346p06s01.scad>
function ldraw_lib__3010p0i() = [
// 0 Brick  1 x  4 with Black Dollar Sign on Yellow Badge Pattern
// 0 Name: 3010p0i.dat
// 0 Author: Chris Böhnke [KnightOfTarenta]
// 0 !LDRAW_ORG Part UPDATE 2025-07
// 0 !LICENSE Licensed under CC BY 4.0 : see CAreadme.txt
// 
// 0 BFC CERTIFY CCW
  [0,"BFC","CERTIFY"],
  [0,"BFC","CCW"],
// 
// 0 !KEYWORDS Bank, BrickLink 3010pb017, city center, money
// 0 !KEYWORDS Rebrickable 3010pr9952, Set 6566, town, Town Junior
// 
// 0 !HISTORY 2025-07-27 [OrionP] Official Update 2025-07
// 
// 1 16 0 0 0 1 0 0 0 1 0 0 0 1 s\3010s01.dat
  [1,16,0,0,0,1,0,0,0,1,0,0,0,1, ldraw_lib__s__3010s01()],
// 
// 0 // Pattern
// 1 16 0 1 -10 0.8148 0 0 0 0.8148 0 0 0 1 s\4346p06s01.dat
  [1,16,0,1,-10,0.8148,0,0,0,0.8148,0,0,0,1, ldraw_lib__s__4346p06s01()],
// 
// 4 16 -40 0 -10 -10.9998 1 -10 0 1 -10 40 0 -10
  [4,16,-40,0,-10,-10.9998,1,-10,0,1,-10,40,0,-10],
// 3 16 40 0 -10 0 1 -10 10.9998 1 -10
  [3,16,40,0,-10,0,1,-10,10.9998,1,-10],
// 4 16 0 22.9996 -10 -10.9998 22.9996 -10 -40 24 -10 40 24 -10
  [4,16,0,22.9996,-10,-10.9998,22.9996,-10,-40,24,-10,40,24,-10],
// 3 16 10.9998 22.9996 -10 0 22.9996 -10 40 24 -10
  [3,16,10.9998,22.9996,-10,0,22.9996,-10,40,24,-10],
// 4 16 10.9998 15.259 -10 10.9998 22.9996 -10 40 24 -10 40 0 -10
  [4,16,10.9998,15.259,-10,10.9998,22.9996,-10,40,24,-10,40,0,-10],
// 3 16 40 0 -10 10.9998 1 -10 10.9998 15.259 -10
  [3,16,40,0,-10,10.9998,1,-10,10.9998,15.259,-10],
// 3 16 -10.9998 15.259 -10 -10.9998 1 -10 -40 0 -10
  [3,16,-10.9998,15.259,-10,-10.9998,1,-10,-40,0,-10],
// 4 16 -40 0 -10 -40 24 -10 -10.9998 22.9996 -10 -10.9998 15.259 -10
  [4,16,-40,0,-10,-40,24,-10,-10.9998,22.9996,-10,-10.9998,15.259,-10],
];
module ldraw_lib__3010p0i(step=0, col=false, unit=2/5, alt=false, line=0.2, solid=!$preview)
    makepoly(ldraw_lib__3010p0i(), step=step, col=col, unit=unit, alt=alt, line=line, solid=solid);
ldraw_lib__3010p0i(line=0.2);
